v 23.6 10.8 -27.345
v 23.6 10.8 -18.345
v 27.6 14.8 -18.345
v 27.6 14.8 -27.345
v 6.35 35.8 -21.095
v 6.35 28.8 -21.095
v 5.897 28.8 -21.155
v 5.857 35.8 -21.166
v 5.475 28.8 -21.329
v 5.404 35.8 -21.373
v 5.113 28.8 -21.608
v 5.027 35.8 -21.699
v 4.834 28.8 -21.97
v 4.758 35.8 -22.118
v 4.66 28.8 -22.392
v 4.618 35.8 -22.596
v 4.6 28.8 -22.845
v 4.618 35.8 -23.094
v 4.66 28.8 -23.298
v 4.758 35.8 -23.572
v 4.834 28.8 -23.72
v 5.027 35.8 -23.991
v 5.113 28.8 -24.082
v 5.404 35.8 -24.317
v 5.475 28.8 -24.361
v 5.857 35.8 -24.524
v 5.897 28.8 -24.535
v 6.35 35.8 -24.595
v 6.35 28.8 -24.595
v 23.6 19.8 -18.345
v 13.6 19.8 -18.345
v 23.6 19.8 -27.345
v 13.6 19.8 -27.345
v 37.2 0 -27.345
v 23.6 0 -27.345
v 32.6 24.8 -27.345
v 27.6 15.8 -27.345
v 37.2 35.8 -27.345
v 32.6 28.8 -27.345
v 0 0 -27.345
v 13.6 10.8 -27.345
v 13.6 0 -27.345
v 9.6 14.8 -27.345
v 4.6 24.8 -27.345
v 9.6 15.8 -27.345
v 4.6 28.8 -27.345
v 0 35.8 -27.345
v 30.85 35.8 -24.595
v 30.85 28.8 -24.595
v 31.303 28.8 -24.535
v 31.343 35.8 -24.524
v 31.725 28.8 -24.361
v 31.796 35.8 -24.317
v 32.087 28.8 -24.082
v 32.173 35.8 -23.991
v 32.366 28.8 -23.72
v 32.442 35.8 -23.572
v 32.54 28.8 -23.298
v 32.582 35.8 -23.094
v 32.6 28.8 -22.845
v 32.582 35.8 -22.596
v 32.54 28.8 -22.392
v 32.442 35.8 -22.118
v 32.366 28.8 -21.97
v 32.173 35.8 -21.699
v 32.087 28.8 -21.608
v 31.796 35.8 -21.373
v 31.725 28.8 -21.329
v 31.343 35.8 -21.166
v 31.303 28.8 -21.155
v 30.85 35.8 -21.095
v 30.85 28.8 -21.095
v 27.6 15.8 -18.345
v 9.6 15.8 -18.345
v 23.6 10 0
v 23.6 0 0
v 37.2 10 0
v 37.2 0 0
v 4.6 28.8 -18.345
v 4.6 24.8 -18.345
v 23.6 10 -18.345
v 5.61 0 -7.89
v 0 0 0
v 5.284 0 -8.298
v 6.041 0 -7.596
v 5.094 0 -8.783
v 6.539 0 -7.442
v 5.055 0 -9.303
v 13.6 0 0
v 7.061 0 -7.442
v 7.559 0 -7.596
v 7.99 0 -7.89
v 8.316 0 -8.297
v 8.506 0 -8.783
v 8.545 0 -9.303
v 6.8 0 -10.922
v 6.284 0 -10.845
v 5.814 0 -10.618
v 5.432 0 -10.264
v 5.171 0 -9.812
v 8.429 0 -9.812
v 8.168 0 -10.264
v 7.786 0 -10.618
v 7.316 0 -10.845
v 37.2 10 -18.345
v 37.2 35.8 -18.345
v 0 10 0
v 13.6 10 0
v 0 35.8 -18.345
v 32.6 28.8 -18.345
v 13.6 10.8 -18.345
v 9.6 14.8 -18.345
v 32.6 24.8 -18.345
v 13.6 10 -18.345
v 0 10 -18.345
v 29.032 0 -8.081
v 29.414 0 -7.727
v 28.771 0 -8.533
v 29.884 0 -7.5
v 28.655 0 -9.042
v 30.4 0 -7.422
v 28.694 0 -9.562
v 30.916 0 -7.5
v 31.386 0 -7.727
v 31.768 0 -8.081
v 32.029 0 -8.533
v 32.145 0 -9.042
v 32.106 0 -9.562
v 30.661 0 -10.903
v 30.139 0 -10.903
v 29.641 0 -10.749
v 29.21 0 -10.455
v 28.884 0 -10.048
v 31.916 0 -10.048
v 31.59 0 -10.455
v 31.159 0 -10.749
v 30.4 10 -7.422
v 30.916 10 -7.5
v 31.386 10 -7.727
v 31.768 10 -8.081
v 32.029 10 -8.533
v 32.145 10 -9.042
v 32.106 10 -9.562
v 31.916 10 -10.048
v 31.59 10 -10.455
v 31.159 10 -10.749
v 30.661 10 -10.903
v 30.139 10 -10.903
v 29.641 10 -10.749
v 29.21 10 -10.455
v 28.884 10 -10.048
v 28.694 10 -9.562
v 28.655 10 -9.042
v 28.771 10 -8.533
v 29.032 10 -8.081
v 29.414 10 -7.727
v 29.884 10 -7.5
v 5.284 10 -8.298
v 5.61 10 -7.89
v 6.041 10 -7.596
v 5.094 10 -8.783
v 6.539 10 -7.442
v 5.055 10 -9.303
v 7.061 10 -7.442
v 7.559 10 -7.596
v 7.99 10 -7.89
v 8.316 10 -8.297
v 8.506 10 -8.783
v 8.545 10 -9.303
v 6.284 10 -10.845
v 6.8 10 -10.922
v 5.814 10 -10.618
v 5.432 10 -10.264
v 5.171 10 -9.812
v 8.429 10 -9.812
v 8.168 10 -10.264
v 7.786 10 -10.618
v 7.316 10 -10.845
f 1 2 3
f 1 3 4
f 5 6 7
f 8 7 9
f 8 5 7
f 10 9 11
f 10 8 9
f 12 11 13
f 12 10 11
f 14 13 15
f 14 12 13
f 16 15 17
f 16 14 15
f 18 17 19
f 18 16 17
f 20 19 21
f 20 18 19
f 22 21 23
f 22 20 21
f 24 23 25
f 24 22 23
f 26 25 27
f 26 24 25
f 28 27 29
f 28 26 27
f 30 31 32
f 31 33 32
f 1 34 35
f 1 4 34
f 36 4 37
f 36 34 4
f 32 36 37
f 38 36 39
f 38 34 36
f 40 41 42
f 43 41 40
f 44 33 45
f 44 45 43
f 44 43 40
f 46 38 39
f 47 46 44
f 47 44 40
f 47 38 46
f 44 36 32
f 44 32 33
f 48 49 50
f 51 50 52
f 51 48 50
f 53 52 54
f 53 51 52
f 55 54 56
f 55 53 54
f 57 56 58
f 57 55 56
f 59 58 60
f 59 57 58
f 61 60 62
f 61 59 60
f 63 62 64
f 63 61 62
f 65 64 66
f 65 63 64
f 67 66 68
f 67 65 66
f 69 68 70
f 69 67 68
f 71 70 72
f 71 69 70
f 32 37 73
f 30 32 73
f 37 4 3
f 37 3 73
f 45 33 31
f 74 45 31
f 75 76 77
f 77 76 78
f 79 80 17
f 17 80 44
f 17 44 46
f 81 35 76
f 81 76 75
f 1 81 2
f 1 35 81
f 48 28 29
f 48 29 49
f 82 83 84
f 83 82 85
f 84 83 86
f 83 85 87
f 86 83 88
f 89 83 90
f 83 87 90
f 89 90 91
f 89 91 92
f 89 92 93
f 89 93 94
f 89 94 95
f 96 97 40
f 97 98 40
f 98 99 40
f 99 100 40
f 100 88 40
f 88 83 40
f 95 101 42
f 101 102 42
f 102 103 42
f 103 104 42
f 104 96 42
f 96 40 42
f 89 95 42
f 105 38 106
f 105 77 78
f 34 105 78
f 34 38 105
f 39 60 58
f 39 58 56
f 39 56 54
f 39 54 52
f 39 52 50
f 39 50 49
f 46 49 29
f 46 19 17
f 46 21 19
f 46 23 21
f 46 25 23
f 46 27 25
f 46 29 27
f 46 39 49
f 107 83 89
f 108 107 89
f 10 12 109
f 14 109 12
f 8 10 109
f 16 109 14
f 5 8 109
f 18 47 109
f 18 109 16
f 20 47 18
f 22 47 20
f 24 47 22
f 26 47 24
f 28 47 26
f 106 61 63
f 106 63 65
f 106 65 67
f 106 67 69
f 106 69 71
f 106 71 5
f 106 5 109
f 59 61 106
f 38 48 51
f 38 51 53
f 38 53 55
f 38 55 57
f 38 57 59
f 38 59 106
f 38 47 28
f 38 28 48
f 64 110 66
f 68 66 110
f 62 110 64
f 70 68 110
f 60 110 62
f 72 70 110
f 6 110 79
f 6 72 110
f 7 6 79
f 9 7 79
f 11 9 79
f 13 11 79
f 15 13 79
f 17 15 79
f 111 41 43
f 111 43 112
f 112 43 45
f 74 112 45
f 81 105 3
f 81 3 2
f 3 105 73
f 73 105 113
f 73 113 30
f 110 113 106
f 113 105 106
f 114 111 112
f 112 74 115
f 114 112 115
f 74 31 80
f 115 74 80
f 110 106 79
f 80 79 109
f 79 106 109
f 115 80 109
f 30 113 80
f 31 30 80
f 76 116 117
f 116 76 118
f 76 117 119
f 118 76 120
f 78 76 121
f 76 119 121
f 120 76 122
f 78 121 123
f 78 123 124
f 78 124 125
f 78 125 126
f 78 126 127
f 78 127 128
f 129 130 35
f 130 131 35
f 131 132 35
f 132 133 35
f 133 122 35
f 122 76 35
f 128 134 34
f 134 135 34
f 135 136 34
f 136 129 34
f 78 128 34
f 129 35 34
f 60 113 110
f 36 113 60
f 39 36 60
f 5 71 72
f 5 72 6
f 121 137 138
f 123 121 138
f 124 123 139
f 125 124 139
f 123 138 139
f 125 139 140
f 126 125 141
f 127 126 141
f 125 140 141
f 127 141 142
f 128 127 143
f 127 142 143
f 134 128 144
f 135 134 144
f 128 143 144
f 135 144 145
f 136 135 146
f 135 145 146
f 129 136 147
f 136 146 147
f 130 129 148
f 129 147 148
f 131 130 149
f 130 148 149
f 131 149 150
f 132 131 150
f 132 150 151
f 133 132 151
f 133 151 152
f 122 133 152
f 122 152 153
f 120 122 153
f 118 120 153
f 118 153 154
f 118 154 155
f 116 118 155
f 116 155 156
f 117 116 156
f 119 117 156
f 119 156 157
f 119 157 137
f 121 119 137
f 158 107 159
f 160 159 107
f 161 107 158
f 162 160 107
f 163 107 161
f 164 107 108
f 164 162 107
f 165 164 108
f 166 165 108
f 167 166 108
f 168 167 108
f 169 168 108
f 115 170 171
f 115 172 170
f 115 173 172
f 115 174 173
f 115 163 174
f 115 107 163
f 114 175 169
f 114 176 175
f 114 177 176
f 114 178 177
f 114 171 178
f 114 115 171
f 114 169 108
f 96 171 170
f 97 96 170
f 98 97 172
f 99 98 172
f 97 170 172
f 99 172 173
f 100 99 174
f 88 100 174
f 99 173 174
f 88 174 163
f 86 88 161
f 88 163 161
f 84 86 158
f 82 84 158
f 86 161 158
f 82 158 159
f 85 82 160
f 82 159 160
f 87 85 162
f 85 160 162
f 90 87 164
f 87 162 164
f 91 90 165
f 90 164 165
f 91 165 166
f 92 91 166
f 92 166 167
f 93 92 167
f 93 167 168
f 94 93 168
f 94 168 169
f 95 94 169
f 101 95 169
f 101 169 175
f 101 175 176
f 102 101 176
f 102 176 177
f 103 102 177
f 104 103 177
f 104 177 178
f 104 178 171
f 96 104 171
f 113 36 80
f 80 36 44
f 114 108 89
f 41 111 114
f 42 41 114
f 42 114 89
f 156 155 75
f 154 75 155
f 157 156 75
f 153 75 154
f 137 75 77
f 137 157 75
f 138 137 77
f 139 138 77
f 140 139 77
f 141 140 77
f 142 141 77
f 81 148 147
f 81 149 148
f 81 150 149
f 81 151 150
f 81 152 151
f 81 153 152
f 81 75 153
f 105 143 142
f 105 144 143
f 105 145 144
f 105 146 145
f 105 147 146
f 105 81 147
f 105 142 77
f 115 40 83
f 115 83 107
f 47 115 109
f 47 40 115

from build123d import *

# Parameters (mm, degrees)
SKETCH1_W             = 13.6
SKETCH1_H             = 27.345
BOSS_EXTRUDE1_DEPTH   = 10
BOSS_EXTRUDE1_2_DEPTH = 10
BOSS_EXTRUDE2_DEPTH   = 9
SKETCH3_R             = 1.75
CUT_EXTRUDE1_DEPTH    = 53.888836487
SKETCH6_W             = 28
SKETCH6_H             = 4
CUT_EXTRUDE2_DEPTH    = 59.422846772
CUT_EXTRUDE3_REACH    = 60.423
CUT_EXTRUDE4_START    = -9
SKETCH8_W             = 18
SKETCH8_H             = 5
CUT_EXTRUDE4_DEPTH    = 9
CHAMFER2_SIZE         = 4


with BuildPart() as part:
    # Sketch1 → Boss-Extrude1 (new body)
    with BuildSketch(Plane(origin=(0, 0, 0), x_dir=(1, 0, 0), z_dir=(0, 1, 0))):
        with Locations((6.8, 13.6725)):
            Rectangle(SKETCH1_W, SKETCH1_H)
    extrude(amount=BOSS_EXTRUDE1_DEPTH)



with BuildPart() as body_2:
    # Sketch1 → Boss-Extrude1 2 (new body)
    with BuildSketch(Plane(origin=(0, 0, 0), x_dir=(1, 0, 0), z_dir=(0, 1, 0))):
        with Locations((30.4, 13.6725)):
            Rectangle(SKETCH1_W, SKETCH1_H)
    extrude(amount=BOSS_EXTRUDE1_2_DEPTH)


with BuildPart() as part_1:
    add(part.part)

    add(body_2.part)  # Boss-Extrude2 merges body 2
    # Sketch2 → Boss-Extrude2 (add)
    with BuildSketch(Plane(origin=(0, 0, -27.345), x_dir=(-1, 0, 0), z_dir=(0, 0, -1))):
        Polygon((-37.2, 35.8), (-37.2, 10), (-31.1, 22), (-31.1, 35.8), align=None)
        Polygon((-31.1, 22), (-37.2, 10), (-31.1, 10), align=None)
        Polygon((-31.1, 35.8), (-31.1, 22), (-31.1, 10), (-23.6, 10), (-23.6, 19.8), (-13.6, 19.8), (-13.6, 10), (-6.1, 10), (-6.1, 22), (-6.1, 35.8), align=None)
        Polygon((0, 35.8), (-6.1, 35.8), (-6.1, 22), (0, 10), align=None)
        Polygon((0, 10), (-6.1, 22), (-6.1, 10), align=None)
    extrude(amount=-BOSS_EXTRUDE2_DEPTH)

    # Sketch3 → Cut-Extrude1 (cut, through all)
    with BuildSketch(Plane(origin=(0, 10, 0), x_dir=(1, 0, 0), z_dir=(0, 1, 0))):
        with Locations(Location((30.4, 9.1725, 0), (0, 0, 270))):
            Circle(SKETCH3_R)
        with Locations(Location((6.8, 9.1725, 0), (0, 0, 90))):
            Circle(SKETCH3_R)
    extrude(amount=-CUT_EXTRUDE1_DEPTH, mode=Mode.SUBTRACT)

    # Sketch6 → Cut-Extrude2 (cut, through all)
    with BuildSketch(Plane(origin=(0, 0, -27.345), x_dir=(-1, 0, 0), z_dir=(0, 0, -1))):
        with Locations((-18.6, 26.8)):
            Rectangle(SKETCH6_W, SKETCH6_H)
    extrude(amount=-CUT_EXTRUDE2_DEPTH, mode=Mode.SUBTRACT)

    # Sketch5 → Cut-Extrude3 (cut, up to next)
    with BuildSketch(Plane(origin=(0, 35.8, 0), x_dir=(1, 0, 0), z_dir=(0, 1, 0)), mode=Mode.PRIVATE) as cut_extrude3_sk1:
        with BuildLine():
            Line((6.35, 24.595), (30.85, 24.595))
            ThreePointArc((30.85, 24.595), (32.6, 22.845), (30.85, 21.095))
            Line((30.85, 21.095), (6.35, 21.095))
            ThreePointArc((6.35, 21.095), (4.6, 22.845), (6.35, 24.595))
        make_face()
    cut_extrude3_tool1 = extrude(cut_extrude3_sk1.sketch, amount=-CUT_EXTRUDE3_REACH, mode=Mode.PRIVATE) & part_1.part
    add(cut_extrude3_tool1.solids().sort_by_distance((18.6, 35.8, -22.845))[0], mode=Mode.SUBTRACT)

    # Sketch8 → Cut-Extrude4 (cut)
    with BuildSketch(Plane.XY.offset(-18.345).offset(CUT_EXTRUDE4_START)):
        with Locations((18.6, 17.3)):
            Rectangle(SKETCH8_W, SKETCH8_H)
    extrude(amount=CUT_EXTRUDE4_DEPTH, mode=Mode.SUBTRACT)

    # Chamfer2
    chamfer2_edges = [part_1.edges().sort_by_distance(p)[0] for p in [
        (27.6, 19.8, -22.845),
        (9.6, 19.8, -22.845),
    ]]
    chamfer(chamfer2_edges, length=CHAMFER2_SIZE)
    chamfer2_2_edges = [part_1.edges().sort_by_distance(p)[0] for p in [
        (23.6, 14.8, -22.845),
        (13.6, 14.8, -22.845),
    ]]
    chamfer(chamfer2_2_edges, length=CHAMFER2_SIZE - 0.0001)  # a hair under: the kernel refuses the full size


solid = part_1.part
